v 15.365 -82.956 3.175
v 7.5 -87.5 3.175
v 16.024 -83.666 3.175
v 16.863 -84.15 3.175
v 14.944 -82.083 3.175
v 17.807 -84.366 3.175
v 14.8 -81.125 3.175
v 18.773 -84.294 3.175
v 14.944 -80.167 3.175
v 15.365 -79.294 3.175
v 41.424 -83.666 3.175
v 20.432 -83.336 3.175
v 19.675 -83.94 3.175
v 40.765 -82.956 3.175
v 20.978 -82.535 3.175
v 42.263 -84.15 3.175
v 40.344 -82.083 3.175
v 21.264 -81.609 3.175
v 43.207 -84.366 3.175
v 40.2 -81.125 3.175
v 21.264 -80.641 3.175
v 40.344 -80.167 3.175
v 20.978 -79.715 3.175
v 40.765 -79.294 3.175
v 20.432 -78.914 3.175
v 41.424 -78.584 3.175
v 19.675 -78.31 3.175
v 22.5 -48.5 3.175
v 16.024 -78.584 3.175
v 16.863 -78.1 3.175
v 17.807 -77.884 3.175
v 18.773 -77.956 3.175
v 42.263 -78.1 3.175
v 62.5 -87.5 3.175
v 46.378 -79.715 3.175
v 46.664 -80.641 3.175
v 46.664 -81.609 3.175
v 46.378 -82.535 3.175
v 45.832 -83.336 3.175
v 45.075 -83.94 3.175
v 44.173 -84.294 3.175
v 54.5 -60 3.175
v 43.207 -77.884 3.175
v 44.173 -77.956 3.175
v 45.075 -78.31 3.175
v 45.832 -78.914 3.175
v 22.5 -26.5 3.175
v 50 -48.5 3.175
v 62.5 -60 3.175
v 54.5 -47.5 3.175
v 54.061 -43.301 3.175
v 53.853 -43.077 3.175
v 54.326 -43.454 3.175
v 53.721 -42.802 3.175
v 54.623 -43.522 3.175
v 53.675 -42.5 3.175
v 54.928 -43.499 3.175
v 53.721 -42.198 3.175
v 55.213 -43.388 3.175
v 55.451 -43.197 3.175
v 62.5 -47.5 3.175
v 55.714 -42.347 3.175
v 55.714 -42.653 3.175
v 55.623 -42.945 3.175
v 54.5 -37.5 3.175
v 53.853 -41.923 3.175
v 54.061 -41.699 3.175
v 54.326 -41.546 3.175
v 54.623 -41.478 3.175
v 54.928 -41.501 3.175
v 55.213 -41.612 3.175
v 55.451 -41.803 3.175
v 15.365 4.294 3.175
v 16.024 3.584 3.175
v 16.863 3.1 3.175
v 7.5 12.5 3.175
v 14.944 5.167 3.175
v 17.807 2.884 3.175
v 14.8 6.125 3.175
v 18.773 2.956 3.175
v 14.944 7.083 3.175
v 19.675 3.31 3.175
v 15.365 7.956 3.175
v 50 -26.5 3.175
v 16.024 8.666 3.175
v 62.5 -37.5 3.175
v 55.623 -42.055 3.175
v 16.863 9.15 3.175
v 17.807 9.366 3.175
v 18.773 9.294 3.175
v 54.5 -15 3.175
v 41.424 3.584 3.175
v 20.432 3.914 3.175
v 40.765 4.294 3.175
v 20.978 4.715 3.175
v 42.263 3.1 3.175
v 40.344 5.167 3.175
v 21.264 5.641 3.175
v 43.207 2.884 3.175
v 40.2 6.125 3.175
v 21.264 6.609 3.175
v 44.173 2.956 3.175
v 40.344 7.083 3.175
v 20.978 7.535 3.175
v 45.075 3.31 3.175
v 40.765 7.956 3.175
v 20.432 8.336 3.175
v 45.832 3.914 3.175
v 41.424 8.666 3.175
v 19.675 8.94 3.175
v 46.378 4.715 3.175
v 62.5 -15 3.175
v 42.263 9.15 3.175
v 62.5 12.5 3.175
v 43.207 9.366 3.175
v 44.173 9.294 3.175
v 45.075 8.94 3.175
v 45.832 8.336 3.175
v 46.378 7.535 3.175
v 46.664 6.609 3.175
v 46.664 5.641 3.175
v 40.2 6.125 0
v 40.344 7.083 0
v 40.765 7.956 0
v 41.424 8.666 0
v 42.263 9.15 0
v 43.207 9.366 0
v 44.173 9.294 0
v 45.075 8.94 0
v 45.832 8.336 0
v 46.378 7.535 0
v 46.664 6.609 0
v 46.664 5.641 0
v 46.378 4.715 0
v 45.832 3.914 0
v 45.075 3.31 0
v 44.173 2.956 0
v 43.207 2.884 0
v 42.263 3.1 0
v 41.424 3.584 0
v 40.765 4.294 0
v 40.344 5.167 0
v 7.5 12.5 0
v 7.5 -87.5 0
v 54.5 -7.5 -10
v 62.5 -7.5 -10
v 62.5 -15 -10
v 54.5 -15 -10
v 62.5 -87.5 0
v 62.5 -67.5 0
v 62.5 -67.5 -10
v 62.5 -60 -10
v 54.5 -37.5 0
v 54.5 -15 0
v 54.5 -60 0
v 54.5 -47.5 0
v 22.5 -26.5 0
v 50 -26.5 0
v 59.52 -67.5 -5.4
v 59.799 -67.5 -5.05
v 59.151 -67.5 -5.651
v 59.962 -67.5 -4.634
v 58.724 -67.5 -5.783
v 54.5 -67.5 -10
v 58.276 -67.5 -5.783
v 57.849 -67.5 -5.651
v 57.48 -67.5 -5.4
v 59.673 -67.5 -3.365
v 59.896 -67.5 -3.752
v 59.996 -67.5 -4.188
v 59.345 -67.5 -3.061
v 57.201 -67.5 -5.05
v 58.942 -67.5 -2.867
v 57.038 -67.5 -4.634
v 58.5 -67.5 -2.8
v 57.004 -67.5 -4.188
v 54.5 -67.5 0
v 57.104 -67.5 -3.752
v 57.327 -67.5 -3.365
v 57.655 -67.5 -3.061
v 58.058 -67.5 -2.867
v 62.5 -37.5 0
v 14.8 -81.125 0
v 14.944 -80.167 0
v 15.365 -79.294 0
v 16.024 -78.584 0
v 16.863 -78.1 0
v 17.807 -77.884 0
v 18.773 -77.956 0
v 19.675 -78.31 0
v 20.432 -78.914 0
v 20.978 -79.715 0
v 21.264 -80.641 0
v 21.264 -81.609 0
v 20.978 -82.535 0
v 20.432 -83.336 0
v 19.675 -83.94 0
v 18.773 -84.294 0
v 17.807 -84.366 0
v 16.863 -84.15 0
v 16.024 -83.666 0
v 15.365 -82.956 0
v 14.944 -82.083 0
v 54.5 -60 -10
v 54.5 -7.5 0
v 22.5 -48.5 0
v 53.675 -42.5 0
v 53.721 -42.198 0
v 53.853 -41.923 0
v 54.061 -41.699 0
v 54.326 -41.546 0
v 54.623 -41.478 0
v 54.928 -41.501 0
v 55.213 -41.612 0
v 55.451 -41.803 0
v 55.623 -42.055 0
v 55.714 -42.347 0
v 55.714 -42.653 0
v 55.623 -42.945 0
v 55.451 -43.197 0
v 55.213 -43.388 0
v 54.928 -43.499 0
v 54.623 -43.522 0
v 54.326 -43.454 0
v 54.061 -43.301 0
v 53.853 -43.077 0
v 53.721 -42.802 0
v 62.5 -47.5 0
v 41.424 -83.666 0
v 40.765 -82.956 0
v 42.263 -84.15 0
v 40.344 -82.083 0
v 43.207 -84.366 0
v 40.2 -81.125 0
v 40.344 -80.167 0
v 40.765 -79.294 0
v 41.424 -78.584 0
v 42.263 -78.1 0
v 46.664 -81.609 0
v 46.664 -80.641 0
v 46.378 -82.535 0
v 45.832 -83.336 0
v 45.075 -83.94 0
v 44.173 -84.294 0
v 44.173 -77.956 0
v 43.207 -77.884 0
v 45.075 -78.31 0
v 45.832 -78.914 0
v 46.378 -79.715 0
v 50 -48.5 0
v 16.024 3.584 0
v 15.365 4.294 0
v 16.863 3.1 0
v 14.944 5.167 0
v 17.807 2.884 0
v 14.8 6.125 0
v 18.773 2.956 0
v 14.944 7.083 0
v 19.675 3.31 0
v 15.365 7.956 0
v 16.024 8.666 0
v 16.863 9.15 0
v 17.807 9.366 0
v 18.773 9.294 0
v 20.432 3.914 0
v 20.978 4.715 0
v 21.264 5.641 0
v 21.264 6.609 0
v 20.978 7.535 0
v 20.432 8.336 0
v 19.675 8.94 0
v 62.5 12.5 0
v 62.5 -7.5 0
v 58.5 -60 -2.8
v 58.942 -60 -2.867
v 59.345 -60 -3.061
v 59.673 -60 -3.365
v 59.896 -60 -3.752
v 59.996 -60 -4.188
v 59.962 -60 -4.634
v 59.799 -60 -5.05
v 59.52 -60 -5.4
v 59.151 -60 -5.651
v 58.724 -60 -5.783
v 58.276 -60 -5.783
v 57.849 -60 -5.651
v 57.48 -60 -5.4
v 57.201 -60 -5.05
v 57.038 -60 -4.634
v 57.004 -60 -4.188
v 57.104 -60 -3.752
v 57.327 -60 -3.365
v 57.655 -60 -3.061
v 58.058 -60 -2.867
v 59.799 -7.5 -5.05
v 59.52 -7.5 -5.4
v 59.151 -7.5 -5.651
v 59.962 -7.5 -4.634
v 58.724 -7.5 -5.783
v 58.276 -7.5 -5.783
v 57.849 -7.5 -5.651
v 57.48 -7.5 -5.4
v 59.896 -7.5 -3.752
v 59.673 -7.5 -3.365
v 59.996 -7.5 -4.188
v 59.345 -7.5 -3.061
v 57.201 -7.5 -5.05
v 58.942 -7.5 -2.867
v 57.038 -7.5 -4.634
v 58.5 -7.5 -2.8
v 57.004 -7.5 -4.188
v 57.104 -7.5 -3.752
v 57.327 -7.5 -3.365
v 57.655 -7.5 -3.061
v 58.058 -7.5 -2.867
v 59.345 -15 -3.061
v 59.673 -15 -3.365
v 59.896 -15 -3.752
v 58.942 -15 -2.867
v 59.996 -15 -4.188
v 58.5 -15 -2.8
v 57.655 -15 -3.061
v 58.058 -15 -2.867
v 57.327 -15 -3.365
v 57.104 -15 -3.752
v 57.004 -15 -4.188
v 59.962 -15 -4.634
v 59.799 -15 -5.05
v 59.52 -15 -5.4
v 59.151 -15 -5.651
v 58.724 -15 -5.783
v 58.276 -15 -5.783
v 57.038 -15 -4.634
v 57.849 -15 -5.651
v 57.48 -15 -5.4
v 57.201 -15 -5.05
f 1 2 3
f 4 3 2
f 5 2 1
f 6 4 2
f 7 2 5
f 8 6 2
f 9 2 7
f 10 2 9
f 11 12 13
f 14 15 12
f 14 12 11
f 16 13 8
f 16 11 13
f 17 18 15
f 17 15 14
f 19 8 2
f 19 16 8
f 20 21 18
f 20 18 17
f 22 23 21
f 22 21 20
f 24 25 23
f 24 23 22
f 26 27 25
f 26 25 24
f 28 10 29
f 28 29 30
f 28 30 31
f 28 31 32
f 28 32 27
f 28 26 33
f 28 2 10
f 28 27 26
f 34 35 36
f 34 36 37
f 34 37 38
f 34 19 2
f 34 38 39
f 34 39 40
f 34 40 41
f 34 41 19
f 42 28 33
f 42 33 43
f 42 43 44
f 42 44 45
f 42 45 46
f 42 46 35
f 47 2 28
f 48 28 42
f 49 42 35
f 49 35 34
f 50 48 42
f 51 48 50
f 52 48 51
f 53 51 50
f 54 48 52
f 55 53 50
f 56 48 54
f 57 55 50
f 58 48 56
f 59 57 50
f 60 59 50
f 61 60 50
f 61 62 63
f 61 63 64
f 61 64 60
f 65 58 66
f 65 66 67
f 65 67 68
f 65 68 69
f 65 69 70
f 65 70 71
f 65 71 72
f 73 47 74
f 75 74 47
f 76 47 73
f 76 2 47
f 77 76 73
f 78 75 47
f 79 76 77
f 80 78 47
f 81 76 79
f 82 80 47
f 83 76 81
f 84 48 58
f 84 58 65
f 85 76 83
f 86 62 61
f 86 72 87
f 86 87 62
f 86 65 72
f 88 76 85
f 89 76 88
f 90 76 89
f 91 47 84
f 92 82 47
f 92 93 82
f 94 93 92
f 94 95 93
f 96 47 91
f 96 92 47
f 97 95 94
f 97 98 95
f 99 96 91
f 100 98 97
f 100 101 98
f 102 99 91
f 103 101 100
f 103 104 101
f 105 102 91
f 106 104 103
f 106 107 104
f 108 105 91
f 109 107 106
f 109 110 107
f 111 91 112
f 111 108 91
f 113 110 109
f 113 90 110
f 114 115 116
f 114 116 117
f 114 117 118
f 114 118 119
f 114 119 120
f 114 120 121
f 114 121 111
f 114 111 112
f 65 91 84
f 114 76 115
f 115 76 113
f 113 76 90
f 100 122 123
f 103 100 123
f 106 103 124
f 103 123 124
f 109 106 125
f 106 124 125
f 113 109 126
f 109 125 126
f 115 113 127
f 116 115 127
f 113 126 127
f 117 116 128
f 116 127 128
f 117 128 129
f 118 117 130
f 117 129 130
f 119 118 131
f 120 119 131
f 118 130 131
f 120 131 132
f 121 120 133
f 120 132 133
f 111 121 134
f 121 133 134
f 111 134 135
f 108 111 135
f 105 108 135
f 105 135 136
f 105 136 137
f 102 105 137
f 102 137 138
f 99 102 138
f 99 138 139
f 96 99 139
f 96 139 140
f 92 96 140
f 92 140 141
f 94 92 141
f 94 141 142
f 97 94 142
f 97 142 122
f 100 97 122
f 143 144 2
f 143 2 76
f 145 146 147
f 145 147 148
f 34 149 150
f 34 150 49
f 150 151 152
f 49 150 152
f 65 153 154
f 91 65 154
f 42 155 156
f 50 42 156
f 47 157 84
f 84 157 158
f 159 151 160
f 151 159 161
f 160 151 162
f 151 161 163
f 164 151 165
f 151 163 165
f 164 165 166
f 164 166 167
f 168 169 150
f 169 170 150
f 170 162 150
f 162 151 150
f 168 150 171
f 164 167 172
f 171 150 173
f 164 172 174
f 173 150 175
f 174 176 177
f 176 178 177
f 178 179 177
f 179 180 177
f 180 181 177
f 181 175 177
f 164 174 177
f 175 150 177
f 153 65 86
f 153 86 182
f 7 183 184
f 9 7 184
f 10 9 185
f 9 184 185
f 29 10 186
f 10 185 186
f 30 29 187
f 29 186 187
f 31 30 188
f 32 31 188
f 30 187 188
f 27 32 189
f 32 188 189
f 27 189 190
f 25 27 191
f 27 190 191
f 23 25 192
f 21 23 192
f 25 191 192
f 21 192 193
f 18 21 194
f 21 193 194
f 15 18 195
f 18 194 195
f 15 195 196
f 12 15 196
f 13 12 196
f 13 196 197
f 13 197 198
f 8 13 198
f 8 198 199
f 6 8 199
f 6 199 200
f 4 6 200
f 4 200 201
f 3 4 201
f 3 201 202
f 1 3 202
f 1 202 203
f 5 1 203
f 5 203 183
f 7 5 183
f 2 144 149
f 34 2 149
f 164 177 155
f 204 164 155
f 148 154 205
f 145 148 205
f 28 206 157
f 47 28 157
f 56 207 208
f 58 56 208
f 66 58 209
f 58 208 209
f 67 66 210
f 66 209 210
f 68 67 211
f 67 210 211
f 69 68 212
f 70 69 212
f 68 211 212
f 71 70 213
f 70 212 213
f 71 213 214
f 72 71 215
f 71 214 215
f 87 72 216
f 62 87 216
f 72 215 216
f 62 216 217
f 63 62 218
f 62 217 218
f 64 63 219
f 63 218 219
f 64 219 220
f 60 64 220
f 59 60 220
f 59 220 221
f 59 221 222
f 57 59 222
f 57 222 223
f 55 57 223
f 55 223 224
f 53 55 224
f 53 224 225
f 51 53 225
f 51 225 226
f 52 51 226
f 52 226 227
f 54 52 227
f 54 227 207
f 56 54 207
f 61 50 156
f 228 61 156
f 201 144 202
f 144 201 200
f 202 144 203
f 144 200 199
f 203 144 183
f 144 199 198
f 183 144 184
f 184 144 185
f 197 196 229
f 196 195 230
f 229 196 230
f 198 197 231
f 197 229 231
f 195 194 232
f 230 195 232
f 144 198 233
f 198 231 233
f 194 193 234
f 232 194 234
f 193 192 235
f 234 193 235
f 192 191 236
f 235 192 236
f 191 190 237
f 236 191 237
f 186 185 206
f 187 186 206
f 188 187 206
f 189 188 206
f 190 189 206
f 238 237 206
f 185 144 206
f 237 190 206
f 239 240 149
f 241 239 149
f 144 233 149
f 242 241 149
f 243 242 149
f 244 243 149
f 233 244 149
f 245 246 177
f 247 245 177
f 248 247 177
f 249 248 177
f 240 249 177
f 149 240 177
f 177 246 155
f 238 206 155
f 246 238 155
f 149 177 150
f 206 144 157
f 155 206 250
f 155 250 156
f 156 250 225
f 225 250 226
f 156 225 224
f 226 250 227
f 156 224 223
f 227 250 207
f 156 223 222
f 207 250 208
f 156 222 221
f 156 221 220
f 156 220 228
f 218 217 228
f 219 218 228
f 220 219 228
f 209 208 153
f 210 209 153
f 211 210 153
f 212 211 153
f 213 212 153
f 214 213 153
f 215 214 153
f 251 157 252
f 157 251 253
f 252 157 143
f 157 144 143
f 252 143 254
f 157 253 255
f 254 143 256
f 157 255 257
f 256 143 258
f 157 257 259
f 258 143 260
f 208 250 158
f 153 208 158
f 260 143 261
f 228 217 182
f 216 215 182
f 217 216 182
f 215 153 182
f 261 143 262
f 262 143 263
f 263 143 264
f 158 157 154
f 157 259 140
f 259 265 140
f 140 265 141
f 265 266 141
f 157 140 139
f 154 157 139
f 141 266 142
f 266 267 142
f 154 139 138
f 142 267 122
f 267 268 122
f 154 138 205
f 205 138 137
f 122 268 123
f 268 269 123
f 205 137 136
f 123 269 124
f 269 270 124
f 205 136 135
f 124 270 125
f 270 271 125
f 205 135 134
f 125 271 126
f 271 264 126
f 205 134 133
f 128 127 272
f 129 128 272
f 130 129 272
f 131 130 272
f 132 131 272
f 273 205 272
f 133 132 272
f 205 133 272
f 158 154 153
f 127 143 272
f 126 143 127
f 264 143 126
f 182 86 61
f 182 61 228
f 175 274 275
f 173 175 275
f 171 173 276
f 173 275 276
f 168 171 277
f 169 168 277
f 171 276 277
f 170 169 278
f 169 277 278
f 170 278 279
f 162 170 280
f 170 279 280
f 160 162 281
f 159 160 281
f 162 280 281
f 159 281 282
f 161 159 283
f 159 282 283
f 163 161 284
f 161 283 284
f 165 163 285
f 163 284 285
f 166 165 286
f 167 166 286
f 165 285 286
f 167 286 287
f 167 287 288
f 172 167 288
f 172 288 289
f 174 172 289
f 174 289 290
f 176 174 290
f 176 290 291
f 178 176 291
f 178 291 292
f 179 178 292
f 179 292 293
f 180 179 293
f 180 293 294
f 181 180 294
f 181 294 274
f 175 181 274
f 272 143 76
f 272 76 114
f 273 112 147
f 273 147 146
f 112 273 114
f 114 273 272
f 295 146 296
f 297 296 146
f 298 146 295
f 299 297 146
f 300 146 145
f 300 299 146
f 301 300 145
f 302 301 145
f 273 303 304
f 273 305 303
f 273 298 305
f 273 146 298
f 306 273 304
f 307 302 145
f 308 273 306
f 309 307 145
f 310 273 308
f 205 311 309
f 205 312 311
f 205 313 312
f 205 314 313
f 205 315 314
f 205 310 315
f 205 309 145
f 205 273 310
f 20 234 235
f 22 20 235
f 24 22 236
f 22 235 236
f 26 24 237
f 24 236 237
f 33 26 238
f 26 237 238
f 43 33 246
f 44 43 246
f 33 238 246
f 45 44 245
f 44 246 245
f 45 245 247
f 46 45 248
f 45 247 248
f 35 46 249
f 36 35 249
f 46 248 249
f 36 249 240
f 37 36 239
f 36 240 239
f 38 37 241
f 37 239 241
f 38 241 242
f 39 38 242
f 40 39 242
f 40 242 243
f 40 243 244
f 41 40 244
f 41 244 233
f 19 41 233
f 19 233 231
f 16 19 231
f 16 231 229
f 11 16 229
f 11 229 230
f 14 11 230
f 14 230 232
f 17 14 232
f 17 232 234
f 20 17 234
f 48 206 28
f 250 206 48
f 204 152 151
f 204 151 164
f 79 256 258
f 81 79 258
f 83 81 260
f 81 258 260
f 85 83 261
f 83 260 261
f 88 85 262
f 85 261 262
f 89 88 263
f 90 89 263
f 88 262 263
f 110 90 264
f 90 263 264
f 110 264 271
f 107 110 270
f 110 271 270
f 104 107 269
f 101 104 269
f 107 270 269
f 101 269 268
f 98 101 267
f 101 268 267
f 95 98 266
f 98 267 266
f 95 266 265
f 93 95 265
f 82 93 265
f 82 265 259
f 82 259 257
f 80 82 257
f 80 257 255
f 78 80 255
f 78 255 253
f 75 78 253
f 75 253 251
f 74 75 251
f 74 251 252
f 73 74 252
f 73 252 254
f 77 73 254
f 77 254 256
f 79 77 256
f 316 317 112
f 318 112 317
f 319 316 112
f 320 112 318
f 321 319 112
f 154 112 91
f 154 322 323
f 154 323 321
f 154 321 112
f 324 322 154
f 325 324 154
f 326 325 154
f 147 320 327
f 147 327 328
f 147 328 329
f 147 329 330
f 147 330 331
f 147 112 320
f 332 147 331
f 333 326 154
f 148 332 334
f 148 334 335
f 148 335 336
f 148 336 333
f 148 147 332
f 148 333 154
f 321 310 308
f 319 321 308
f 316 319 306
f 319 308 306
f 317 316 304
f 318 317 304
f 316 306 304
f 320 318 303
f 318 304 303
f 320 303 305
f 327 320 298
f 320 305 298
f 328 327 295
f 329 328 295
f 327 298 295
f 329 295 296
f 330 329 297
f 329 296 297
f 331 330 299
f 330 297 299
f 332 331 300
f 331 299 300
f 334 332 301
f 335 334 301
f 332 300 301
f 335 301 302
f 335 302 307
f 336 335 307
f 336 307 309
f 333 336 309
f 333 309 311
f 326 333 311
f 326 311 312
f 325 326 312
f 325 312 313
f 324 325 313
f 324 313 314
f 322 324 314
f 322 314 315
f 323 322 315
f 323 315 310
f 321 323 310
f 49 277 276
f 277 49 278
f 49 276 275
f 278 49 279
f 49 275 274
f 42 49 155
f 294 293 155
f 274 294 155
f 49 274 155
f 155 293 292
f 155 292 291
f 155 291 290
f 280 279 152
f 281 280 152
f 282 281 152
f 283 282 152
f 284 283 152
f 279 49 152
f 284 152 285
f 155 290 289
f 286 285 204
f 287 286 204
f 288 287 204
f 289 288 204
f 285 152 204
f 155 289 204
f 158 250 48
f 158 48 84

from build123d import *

# Parameters (mm, degrees)
SKETCH1_W           = 55
SKETCH1_H           = 100
SKETCH1_W_2         = 27.5
SKETCH1_H_2         = 22
BOSS_EXTRUDE1_DEPTH = 3.175
SKETCH2_W           = 8
SKETCH2_H           = 60
BOSS_EXTRUDE2_DEPTH = 10
SKETCH3_W           = 8
SKETCH3_H           = 45
CUT_EXTRUDE1_DEPTH  = 10
SKETCH4_R           = 1.5
CUT_EXTRUDE2_DEPTH  = 119.348003785
SKETCH5_R           = 3.25
CUT_EXTRUDE3_DEPTH  = 108.993055332
SKETCH7_W           = 8
SKETCH7_H           = 45
CUT_EXTRUDE5_DEPTH  = 108.993055332
SKETCH8_W           = 3.175
SKETCH8_H           = 10
BOSS_EXTRUDE4_DEPTH = 8
SKETCH9_R           = 1.025
CUT_EXTRUDE6_DEPTH  = 108.993055332


with BuildPart() as part:
    # Sketch1 → Boss-Extrude1 (new body)
    with BuildSketch(Plane.XY):
        with Locations((35, -37.5)):
            Rectangle(SKETCH1_W, SKETCH1_H)
        with Locations((36.25, -37.5)):
            Rectangle(SKETCH1_W_2, SKETCH1_H_2, mode=Mode.SUBTRACT)
    extrude(amount=BOSS_EXTRUDE1_DEPTH)

    # Sketch2 → Boss-Extrude2 (add)
    with BuildSketch(Plane(origin=(0, 0, 0), x_dir=(-1, 0, 0), z_dir=(0, 0, -1))):
        with Locations((-58.5, -37.5)):
            Rectangle(SKETCH2_W, SKETCH2_H)
    extrude(amount=BOSS_EXTRUDE2_DEPTH)

    # Sketch3 → Cut-Extrude1 (cut)
    with BuildSketch(Plane(origin=(0, 0, -10), x_dir=(-1, 0, 0), z_dir=(0, 0, -1))):
        with Locations((-58.5, -37.5)):
            Rectangle(SKETCH3_W, SKETCH3_H)
    extrude(amount=-CUT_EXTRUDE1_DEPTH, mode=Mode.SUBTRACT)

    # Sketch4 → Cut-Extrude2 (cut, through all)
    with BuildSketch(Plane(origin=(0, 12.5, 0), x_dir=(1, 0, 0), z_dir=(0, 1, 0))):
        with Locations(Location((58.5, 4.3, 0), (0, 0, 270))):
            Circle(SKETCH4_R)
    extrude(amount=-CUT_EXTRUDE2_DEPTH, mode=Mode.SUBTRACT)

    # Sketch5 → Cut-Extrude3 (cut, through all)
    with BuildSketch(Plane(origin=(0, 0, 0), x_dir=(-1, 0, 0), z_dir=(0, 0, -1))):
        with Locations((-43.45, -81.125)):
            Circle(SKETCH5_R)
        with Locations((-18.05, -81.125)):
            Circle(SKETCH5_R)
        with Locations((-18.05, 6.125)):
            Circle(SKETCH5_R)
        with Locations((-43.45, 6.125)):
            Circle(SKETCH5_R)
    extrude(amount=-CUT_EXTRUDE3_DEPTH, mode=Mode.SUBTRACT)

    # Sketch7 → Cut-Extrude5 (cut, through all)
    with BuildSketch(Plane(origin=(0, 0, 0), x_dir=(-1, 0, 0), z_dir=(0, 0, -1))):
        with Locations((-58.5, -37.5)):
            Rectangle(SKETCH7_W, SKETCH7_H)
    extrude(amount=-CUT_EXTRUDE5_DEPTH, mode=Mode.SUBTRACT)

    # Sketch8 → Boss-Extrude4 (add)
    with BuildSketch(Plane(origin=(54.5, 0, 0), x_dir=(0, 0, -1), z_dir=(1, 0, 0))):
        with Locations((-1.5875, -42.5)):
            Rectangle(SKETCH8_W, SKETCH8_H)
    extrude(amount=BOSS_EXTRUDE4_DEPTH)

    # Sketch9 → Cut-Extrude6 (cut, through all)
    with BuildSketch(Plane(origin=(0, 0, 0), x_dir=(-1, 0, 0), z_dir=(0, 0, -1))):
        with Locations((-54.7, -42.5)):
            Circle(SKETCH9_R)
    extrude(amount=-CUT_EXTRUDE6_DEPTH, mode=Mode.SUBTRACT)


solid = part.part
